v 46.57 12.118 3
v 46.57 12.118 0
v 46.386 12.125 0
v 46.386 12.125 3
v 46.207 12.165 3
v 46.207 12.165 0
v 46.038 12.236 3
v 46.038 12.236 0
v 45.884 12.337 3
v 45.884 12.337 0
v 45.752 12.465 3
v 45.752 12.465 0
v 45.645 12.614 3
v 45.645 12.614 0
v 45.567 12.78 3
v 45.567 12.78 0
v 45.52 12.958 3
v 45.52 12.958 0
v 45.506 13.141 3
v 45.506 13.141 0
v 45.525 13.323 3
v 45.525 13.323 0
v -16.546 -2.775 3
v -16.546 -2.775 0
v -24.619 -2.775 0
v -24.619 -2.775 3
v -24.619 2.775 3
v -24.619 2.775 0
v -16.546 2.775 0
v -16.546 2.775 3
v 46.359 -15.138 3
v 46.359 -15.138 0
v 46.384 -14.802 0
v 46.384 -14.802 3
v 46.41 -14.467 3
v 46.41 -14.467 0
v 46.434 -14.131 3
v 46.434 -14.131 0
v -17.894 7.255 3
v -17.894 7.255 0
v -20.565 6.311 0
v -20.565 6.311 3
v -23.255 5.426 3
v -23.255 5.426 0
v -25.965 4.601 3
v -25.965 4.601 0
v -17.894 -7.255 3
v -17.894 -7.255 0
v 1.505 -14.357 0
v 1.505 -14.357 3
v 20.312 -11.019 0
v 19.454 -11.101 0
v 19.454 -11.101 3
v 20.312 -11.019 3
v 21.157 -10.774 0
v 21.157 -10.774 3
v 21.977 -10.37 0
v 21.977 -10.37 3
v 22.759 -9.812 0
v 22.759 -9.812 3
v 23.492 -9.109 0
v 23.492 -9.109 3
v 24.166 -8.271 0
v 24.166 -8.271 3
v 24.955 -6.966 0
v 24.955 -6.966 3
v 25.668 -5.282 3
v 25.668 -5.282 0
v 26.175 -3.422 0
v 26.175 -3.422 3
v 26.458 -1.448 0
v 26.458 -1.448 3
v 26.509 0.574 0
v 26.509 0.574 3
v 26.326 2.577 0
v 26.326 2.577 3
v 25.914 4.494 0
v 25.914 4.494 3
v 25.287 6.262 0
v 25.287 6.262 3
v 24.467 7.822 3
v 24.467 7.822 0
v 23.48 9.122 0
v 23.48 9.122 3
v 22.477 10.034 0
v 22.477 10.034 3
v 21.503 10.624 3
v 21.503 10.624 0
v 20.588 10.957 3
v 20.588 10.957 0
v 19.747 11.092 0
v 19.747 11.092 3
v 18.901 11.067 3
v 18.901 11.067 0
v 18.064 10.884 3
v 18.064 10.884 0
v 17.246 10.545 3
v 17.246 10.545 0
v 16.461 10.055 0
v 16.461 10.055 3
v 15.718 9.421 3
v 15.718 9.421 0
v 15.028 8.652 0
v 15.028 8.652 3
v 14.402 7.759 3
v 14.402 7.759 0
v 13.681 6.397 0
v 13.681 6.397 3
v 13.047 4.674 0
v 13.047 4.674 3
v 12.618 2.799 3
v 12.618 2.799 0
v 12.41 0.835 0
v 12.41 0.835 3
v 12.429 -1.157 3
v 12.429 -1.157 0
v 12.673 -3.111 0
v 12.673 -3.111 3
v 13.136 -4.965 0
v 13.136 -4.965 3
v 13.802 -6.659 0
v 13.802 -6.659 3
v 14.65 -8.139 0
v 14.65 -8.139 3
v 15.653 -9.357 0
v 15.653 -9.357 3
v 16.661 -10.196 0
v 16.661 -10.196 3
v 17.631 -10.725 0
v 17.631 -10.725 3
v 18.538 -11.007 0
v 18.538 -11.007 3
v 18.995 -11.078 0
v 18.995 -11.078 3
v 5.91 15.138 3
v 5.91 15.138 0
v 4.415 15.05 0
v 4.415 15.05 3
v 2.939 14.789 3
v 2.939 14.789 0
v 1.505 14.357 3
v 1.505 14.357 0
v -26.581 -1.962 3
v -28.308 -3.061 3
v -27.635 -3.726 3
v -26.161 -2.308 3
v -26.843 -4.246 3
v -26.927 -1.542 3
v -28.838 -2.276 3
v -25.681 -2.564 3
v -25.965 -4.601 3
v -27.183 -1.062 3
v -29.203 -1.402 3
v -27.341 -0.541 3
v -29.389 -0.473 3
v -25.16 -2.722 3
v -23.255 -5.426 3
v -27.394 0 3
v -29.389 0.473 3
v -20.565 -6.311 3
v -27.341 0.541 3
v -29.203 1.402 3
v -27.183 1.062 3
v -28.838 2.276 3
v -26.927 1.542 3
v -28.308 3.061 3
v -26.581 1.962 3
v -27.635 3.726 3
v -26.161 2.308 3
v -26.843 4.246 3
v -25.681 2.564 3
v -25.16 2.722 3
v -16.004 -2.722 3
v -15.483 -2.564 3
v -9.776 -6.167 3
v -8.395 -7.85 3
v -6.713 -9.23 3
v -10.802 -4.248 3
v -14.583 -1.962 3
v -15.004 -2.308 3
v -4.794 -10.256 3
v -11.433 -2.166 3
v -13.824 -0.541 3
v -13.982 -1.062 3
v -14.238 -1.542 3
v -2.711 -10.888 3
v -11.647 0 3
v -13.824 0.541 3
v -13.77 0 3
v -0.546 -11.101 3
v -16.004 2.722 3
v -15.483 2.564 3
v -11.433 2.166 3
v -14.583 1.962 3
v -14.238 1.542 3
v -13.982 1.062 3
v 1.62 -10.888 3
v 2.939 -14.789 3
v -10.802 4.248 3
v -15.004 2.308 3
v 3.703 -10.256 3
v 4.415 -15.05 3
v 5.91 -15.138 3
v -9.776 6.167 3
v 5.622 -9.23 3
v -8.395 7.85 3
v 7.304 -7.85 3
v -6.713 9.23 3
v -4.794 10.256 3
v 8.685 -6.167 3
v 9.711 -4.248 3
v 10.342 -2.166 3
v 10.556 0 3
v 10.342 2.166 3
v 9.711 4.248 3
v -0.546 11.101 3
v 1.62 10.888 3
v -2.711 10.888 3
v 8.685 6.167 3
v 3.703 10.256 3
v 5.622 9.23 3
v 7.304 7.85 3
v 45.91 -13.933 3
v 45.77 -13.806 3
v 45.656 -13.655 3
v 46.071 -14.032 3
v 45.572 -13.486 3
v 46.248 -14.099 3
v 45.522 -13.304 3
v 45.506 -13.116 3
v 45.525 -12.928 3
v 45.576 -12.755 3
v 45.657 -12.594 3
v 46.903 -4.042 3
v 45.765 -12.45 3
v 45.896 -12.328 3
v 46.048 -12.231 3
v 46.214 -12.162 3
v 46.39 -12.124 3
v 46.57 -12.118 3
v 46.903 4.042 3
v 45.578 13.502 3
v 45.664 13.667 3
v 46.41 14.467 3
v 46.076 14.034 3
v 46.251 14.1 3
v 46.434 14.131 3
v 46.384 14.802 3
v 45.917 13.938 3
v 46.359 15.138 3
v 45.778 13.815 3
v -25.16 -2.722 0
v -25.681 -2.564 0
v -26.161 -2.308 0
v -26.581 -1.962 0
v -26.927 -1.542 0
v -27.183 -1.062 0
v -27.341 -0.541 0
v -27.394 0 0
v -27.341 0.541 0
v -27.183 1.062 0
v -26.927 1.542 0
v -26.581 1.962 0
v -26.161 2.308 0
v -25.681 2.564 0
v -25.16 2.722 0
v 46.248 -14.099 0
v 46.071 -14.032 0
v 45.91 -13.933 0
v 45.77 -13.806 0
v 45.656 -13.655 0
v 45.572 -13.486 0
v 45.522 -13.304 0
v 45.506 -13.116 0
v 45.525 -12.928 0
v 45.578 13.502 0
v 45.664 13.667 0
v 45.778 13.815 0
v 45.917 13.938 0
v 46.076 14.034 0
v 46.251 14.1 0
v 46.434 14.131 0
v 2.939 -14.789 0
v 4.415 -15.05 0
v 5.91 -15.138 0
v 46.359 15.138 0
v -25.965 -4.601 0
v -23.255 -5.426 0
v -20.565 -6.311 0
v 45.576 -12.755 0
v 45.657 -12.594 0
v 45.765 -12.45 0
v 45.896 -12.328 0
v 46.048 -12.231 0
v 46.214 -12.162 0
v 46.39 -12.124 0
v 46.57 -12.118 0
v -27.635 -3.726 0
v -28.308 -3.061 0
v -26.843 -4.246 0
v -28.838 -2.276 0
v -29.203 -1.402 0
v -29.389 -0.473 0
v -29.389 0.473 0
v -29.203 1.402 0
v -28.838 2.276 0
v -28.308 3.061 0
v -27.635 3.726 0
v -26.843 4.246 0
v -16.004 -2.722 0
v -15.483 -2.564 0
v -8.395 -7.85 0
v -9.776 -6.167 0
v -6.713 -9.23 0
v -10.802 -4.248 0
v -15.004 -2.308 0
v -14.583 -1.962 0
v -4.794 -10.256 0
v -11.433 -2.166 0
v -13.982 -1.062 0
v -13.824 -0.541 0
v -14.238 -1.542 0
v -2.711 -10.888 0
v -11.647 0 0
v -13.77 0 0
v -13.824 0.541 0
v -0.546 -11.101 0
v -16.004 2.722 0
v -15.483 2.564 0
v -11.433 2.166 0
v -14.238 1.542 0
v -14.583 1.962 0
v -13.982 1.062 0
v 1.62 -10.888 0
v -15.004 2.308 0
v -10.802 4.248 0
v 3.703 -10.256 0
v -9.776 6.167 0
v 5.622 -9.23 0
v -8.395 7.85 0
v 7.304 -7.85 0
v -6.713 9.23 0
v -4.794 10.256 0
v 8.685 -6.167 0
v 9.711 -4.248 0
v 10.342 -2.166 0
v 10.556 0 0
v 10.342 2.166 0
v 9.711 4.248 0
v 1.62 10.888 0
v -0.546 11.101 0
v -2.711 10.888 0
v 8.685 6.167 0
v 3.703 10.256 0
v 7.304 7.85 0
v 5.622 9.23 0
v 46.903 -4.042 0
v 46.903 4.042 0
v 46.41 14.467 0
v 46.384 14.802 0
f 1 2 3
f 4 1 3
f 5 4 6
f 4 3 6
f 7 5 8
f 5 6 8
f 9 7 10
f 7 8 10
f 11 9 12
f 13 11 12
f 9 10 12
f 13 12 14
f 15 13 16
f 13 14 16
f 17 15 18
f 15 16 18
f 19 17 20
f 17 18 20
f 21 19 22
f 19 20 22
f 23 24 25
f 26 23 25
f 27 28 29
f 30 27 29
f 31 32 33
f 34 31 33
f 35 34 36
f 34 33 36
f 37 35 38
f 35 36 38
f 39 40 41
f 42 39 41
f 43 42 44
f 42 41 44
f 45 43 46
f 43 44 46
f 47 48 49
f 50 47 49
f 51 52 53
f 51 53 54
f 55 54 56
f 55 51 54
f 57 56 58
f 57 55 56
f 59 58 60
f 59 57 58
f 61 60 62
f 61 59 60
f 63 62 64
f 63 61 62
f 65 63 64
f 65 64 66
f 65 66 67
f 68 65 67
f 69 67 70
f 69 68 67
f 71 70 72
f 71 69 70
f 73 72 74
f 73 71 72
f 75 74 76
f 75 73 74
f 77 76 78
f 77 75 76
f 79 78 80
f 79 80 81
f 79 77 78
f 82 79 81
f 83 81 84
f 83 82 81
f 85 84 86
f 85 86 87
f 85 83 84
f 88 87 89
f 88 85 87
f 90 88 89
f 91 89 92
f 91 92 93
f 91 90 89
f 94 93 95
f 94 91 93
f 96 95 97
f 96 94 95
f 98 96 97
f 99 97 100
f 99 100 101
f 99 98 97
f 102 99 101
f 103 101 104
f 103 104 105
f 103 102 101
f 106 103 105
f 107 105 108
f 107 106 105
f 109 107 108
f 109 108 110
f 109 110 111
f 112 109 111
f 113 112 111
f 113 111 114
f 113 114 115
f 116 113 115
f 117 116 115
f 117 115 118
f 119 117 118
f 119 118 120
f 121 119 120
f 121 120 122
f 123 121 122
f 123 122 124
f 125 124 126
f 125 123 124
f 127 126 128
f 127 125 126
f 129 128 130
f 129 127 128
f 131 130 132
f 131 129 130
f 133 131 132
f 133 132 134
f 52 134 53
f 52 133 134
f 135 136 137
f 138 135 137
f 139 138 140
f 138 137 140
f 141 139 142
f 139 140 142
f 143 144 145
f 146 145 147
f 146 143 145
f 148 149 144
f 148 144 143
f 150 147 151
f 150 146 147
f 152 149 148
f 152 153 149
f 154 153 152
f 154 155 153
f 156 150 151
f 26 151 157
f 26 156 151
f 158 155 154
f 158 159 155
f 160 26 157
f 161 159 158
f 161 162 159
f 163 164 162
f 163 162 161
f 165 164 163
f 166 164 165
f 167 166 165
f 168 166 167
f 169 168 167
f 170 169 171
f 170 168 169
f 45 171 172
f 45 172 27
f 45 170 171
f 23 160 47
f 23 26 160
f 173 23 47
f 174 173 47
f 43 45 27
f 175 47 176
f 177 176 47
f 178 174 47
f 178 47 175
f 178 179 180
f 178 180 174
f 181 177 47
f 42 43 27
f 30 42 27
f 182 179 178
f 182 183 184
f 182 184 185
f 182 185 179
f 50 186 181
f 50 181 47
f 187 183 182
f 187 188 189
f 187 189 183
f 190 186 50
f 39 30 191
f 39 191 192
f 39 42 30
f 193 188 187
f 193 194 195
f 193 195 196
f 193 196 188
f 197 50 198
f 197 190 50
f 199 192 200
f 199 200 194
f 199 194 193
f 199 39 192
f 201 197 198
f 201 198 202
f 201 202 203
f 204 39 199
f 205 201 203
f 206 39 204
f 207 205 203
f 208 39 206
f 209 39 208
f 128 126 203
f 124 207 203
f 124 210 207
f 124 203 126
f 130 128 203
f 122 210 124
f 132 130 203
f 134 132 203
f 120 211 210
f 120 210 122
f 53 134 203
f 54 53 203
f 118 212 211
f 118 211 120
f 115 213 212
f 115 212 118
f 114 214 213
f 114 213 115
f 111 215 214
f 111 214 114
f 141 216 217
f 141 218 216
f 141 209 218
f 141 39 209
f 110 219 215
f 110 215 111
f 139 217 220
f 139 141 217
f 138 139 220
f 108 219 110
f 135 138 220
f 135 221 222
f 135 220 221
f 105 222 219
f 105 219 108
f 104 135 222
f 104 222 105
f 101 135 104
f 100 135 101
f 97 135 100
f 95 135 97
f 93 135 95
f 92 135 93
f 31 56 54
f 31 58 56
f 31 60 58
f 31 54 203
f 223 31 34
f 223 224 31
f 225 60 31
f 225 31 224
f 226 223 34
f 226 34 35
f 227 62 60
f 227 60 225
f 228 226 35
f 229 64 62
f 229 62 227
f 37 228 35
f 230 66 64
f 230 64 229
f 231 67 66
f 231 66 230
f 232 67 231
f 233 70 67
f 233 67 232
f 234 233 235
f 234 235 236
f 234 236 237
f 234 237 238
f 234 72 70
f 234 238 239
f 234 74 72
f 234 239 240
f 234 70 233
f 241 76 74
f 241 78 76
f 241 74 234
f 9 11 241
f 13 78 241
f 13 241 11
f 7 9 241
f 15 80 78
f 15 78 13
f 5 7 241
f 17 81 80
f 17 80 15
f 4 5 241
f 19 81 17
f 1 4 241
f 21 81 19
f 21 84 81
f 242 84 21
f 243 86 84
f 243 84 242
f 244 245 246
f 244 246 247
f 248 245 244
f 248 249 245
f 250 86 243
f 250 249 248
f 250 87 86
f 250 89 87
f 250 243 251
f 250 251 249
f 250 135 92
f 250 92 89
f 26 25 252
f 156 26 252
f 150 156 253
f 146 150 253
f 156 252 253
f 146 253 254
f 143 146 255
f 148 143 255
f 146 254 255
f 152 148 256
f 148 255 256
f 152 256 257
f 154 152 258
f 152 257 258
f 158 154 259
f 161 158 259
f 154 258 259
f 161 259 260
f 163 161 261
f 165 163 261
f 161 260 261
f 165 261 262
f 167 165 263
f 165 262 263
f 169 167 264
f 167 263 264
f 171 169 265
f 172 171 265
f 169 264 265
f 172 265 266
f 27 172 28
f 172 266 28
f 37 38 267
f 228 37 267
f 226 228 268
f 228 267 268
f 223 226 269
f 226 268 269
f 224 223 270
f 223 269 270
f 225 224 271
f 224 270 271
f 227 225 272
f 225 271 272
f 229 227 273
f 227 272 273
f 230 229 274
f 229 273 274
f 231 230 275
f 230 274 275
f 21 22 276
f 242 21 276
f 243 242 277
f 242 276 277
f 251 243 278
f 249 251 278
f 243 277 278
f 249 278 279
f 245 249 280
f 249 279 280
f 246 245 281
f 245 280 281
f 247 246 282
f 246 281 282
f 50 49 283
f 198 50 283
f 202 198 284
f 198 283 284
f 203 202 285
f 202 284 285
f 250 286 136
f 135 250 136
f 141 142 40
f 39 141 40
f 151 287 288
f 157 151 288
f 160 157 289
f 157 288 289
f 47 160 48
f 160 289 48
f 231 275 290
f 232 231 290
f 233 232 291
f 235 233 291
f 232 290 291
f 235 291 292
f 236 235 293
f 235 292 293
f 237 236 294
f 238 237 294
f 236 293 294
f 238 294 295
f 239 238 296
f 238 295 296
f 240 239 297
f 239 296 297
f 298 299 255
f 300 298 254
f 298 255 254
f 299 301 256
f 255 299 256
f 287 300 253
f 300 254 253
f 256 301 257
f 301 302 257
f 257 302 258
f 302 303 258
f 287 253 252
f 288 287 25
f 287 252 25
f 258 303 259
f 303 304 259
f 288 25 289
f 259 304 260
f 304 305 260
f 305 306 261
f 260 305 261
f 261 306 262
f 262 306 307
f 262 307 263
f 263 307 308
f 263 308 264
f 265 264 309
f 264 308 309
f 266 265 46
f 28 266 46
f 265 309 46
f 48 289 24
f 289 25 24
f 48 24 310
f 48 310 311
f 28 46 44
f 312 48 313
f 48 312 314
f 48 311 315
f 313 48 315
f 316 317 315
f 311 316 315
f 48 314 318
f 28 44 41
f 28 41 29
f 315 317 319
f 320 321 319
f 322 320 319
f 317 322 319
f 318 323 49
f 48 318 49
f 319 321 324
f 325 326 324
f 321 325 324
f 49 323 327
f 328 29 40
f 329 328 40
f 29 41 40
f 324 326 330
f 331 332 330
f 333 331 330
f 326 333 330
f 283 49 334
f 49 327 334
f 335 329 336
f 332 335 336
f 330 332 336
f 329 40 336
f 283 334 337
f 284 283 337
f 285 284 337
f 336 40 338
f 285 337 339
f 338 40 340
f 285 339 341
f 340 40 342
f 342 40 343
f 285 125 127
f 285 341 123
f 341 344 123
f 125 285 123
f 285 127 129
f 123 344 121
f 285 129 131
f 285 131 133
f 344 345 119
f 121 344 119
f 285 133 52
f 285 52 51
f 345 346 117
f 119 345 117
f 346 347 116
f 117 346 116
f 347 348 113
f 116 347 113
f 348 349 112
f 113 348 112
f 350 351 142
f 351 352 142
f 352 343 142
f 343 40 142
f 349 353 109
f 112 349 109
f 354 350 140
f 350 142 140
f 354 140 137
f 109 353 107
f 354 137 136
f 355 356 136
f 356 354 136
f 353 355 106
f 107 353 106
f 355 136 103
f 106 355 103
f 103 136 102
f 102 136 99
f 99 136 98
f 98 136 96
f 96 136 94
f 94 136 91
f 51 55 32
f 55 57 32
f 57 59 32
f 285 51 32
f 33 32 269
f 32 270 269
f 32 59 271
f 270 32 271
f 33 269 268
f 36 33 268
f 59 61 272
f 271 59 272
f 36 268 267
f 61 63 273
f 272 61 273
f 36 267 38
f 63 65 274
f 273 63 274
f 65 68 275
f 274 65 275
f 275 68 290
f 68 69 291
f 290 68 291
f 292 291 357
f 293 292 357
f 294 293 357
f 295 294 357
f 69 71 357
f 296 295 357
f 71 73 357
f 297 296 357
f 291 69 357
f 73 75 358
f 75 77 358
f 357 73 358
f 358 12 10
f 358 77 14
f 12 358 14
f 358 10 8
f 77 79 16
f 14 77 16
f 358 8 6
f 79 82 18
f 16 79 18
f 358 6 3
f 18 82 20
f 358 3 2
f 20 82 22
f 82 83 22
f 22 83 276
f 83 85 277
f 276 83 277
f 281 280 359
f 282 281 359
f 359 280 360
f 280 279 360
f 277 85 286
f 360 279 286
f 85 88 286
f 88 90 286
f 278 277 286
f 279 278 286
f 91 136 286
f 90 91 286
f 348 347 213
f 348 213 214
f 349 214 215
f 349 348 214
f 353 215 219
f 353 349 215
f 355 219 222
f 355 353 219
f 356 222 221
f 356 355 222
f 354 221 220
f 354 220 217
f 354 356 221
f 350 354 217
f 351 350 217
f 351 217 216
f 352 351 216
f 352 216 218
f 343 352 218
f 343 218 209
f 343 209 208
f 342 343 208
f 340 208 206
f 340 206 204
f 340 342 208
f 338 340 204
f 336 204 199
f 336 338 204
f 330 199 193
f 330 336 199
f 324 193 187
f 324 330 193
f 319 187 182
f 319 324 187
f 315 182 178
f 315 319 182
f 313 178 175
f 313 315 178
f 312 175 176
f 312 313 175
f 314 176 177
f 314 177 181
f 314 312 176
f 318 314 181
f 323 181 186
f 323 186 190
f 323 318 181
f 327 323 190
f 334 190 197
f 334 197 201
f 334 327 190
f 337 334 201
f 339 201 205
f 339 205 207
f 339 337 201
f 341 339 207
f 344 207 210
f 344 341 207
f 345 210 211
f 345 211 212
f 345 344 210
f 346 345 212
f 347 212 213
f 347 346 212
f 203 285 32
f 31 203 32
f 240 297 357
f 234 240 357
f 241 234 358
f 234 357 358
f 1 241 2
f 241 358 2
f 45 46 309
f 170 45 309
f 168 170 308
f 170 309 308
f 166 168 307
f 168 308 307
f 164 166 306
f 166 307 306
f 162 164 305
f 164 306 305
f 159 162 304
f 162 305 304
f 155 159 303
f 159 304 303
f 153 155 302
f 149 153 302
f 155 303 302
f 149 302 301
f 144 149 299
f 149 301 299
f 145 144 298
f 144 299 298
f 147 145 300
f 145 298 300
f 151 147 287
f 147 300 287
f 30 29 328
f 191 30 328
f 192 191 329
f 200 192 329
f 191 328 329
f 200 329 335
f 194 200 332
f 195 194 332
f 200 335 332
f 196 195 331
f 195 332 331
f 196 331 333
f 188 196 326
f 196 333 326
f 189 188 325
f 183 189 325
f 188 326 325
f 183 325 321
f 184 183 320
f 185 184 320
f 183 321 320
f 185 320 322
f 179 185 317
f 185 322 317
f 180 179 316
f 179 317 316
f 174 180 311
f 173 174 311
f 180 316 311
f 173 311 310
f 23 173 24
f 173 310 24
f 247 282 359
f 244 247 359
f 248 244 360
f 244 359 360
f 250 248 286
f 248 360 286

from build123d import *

# Parameters (mm, degrees)
SKETCH1_R           = 11.1010859
SKETCH1_RX          = 11.1010859
SKETCH1_RY          = 7.064327391
BOSS_EXTRUDE1_DEPTH = 3


with BuildPart() as part:
    # Sketch1 → Boss-Extrude1 (new body)
    with BuildSketch(Plane.XY):
        with BuildLine():
            Line((28.826197236, 15.137844409), (5.91044133, 15.137844409))
            ThreePointArc((5.91044133, 15.137844409), (3.673142738, 14.941061094), (1.504545567, 14.356753838))
            Line((1.504545567, 14.356753838), (-17.894214973, 7.255421854))
            ThreePointArc((-17.894214973, 7.255421854), (-21.907637047, 5.861214166), (-25.965065064, 4.60079768))
            ThreePointArc((-25.965065064, 4.60079768), (-29.412703897, 0), (-25.965065064, -4.60079768))
            ThreePointArc((-25.965065064, -4.60079768), (-21.907637047, -5.861214166), (-17.894214973, -7.255421854))
            Line((-17.894214973, -7.255421854), (1.504545567, -14.356753838))
            ThreePointArc((1.504545567, -14.356753838), (3.673142738, -14.941061094), (5.91044133, -15.137844409))
            Line((5.91044133, -15.137844409), (28.826197236, -15.137844409))
            Line((28.826197236, -15.137844409), (46.358712744, -15.137844409))
            ThreePointArc((46.358712744, -15.137844409), (46.397106085, -14.634708554), (46.434201657, -14.131475353))
            ThreePointArc((46.434201657, -14.131475353), (45.709460852, -13.733597625), (45.525288247, -12.927597395))
            ThreePointArc((45.525288247, -12.927597395), (45.896463104, -12.328004553), (46.569590651, -12.117810222))
            ThreePointArc((46.569590651, -12.117810222), (46.945219405, 0), (46.569590651, 12.117810222))
            ThreePointArc((46.569590651, 12.117810222), (45.752067528, 12.464773232), (45.525288247, 13.323434133))
            ThreePointArc((45.525288247, 13.323434133), (45.844356214, 13.879744795), (46.434201657, 14.131475353))
            ThreePointArc((46.434201657, 14.131475353), (46.397106085, 14.634708554), (46.358712744, 15.137844409))
            Line((46.358712744, 15.137844409), (28.826197236, 15.137844409))
        make_face()
        with Locations((-0.54553615, 0)):
            Circle(SKETCH1_R, mode=Mode.SUBTRACT)
        with Locations(Location((19.45446385, 0), (0, 0, -90))):
            Ellipse(SKETCH1_RX, SKETCH1_RY, mode=Mode.SUBTRACT)
        with BuildLine():
            Line((-16.54553615, -2.775271475), (-24.619053168, -2.775271475))
            ThreePointArc((-24.619053168, -2.775271475), (-27.394324643, 0), (-24.619053168, 2.775271475))
            Line((-24.619053168, 2.775271475), (-16.54553615, 2.775271475))
            ThreePointArc((-16.54553615, 2.775271475), (-13.770264675, 0), (-16.54553615, -2.775271475))
        make_face(mode=Mode.SUBTRACT)
    extrude(amount=BOSS_EXTRUDE1_DEPTH)


solid = part.part
